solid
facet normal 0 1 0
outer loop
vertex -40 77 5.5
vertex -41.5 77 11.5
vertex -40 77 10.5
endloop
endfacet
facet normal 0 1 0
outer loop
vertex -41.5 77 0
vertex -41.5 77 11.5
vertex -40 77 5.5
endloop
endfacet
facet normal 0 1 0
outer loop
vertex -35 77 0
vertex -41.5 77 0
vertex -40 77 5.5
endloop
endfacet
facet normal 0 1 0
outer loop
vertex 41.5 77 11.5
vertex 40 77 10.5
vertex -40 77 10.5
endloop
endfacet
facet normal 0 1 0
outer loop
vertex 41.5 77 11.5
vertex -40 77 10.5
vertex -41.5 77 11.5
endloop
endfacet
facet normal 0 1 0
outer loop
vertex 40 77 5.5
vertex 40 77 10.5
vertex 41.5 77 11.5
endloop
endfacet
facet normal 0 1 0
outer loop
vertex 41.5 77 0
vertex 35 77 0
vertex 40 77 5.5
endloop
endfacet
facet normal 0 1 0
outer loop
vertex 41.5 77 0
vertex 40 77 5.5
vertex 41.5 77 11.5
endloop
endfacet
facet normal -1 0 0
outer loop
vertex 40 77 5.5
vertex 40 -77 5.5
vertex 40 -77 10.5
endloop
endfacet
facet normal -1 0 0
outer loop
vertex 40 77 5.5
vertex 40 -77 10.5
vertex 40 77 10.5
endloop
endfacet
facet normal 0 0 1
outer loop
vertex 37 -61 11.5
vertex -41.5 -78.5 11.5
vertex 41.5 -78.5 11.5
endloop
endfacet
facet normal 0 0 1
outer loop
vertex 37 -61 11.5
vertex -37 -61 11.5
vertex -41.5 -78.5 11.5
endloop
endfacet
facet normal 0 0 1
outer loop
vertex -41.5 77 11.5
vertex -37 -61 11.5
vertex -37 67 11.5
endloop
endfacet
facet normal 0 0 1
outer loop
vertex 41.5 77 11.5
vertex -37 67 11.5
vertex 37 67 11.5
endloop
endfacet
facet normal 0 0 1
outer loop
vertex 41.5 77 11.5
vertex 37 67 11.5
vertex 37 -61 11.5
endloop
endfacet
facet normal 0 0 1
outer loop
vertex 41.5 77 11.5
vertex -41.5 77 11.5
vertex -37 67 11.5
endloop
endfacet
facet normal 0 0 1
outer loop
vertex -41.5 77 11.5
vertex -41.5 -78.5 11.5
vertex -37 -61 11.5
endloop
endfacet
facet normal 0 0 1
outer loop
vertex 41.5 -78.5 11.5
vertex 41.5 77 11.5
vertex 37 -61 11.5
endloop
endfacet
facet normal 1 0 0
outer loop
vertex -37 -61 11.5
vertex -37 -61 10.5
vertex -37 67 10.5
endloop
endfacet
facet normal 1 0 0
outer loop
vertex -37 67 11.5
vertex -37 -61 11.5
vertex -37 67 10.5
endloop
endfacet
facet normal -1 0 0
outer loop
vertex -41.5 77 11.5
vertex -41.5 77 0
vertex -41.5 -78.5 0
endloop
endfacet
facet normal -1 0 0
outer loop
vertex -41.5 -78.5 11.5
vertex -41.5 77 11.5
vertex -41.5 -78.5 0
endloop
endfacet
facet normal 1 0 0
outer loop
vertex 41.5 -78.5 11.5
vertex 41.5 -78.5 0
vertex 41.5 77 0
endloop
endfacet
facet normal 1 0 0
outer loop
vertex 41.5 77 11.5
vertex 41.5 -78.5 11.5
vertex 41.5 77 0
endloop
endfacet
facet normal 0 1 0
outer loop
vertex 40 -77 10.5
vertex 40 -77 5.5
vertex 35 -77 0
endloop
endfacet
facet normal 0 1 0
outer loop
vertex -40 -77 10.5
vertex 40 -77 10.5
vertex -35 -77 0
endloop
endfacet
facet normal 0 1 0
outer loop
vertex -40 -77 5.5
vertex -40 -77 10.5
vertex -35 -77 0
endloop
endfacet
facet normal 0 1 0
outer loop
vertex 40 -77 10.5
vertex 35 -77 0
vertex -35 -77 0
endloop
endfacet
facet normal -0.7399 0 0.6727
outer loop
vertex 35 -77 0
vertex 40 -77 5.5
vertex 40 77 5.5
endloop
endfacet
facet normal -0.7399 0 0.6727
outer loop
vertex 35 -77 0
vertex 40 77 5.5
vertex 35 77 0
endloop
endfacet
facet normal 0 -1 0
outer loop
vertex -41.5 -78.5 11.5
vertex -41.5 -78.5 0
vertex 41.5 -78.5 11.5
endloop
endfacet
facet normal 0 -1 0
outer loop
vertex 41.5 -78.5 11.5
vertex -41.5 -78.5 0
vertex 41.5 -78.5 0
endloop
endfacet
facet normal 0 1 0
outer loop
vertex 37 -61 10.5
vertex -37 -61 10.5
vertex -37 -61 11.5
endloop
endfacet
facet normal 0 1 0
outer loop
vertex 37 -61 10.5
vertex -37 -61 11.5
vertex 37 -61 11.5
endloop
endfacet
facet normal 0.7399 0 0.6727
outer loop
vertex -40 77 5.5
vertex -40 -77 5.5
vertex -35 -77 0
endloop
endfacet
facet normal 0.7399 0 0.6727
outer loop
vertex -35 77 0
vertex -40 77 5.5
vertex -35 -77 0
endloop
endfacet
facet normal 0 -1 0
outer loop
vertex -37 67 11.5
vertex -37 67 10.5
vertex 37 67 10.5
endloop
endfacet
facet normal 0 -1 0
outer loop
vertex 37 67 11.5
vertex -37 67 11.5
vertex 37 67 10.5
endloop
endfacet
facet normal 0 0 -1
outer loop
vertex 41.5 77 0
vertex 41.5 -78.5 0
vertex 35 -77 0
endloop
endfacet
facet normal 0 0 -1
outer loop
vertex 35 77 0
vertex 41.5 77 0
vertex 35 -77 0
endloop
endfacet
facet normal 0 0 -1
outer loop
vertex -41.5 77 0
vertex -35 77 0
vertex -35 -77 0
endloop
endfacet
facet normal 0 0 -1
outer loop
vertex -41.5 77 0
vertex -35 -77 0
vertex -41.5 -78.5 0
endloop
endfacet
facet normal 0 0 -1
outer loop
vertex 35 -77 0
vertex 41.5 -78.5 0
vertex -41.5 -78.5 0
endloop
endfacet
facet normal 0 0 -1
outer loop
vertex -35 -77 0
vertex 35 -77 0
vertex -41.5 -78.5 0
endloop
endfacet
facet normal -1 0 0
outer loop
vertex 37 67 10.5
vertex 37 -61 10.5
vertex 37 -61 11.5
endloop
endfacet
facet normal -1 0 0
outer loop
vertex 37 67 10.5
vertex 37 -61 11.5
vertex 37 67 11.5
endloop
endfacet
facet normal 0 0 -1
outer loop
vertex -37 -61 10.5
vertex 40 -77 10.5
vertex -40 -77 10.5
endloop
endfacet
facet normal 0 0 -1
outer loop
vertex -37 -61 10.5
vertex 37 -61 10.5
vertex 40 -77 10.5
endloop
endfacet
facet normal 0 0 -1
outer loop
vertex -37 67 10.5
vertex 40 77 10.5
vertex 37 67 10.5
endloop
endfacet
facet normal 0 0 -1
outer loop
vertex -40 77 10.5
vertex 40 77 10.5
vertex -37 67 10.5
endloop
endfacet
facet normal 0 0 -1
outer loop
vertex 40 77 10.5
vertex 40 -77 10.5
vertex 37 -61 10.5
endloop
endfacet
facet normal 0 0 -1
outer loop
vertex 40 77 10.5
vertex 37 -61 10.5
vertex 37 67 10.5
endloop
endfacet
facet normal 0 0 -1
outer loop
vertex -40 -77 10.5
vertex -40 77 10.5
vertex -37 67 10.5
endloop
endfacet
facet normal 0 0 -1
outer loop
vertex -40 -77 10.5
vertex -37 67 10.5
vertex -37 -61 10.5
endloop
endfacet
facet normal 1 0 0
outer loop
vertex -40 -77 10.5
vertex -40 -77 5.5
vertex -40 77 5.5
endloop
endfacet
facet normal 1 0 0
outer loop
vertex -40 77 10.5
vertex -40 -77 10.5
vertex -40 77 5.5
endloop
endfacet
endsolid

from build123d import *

# Parameters (mm, degrees)
CROQUIS1_W              = 74
CROQUIS1_H              = 128
SALIENTE_EXTRUIR1_DEPTH = 11.5
CROQUIS2_W              = 80
CROQUIS2_H              = 154
CORTAR_EXTRUIR1_DEPTH   = 10.5
SALIENTE_EXTRUIR3_DEPTH = 154


with BuildPart() as part:
    # Croquis1 → Saliente-Extruir1 (new body)
    with BuildSketch(Plane.XY):
        Polygon((-40, 77), (-41.5, 77), (-41.5, -78.5), (41.5, -78.5), (41.5, 77), (40, 77), align=None)
        with Locations((0, 3)):
            Rectangle(CROQUIS1_W, CROQUIS1_H, mode=Mode.SUBTRACT)
    extrude(amount=SALIENTE_EXTRUIR1_DEPTH)

    # Croquis2 → Cortar-Extruir1 (cut)
    with BuildSketch(Plane(origin=(0, 0, 0), x_dir=(-1, 0, 0), z_dir=(0, 0, -1))):
        Rectangle(CROQUIS2_W, CROQUIS2_H)
    extrude(amount=-CORTAR_EXTRUIR1_DEPTH, mode=Mode.SUBTRACT)

    # Croquis3 → Saliente-Extruir3 (add, through all)
    with BuildSketch(Plane(origin=(0, -77, 0), x_dir=(1, 0, 0), z_dir=(0, 1, 0))):
        Polygon((-40, -5.5), (-35, 0), (-40, 0), align=None)
        Polygon((40, 0), (40, -5.5), (35, 0), align=None)
    extrude(amount=SALIENTE_EXTRUIR3_DEPTH)


solid = part.part
